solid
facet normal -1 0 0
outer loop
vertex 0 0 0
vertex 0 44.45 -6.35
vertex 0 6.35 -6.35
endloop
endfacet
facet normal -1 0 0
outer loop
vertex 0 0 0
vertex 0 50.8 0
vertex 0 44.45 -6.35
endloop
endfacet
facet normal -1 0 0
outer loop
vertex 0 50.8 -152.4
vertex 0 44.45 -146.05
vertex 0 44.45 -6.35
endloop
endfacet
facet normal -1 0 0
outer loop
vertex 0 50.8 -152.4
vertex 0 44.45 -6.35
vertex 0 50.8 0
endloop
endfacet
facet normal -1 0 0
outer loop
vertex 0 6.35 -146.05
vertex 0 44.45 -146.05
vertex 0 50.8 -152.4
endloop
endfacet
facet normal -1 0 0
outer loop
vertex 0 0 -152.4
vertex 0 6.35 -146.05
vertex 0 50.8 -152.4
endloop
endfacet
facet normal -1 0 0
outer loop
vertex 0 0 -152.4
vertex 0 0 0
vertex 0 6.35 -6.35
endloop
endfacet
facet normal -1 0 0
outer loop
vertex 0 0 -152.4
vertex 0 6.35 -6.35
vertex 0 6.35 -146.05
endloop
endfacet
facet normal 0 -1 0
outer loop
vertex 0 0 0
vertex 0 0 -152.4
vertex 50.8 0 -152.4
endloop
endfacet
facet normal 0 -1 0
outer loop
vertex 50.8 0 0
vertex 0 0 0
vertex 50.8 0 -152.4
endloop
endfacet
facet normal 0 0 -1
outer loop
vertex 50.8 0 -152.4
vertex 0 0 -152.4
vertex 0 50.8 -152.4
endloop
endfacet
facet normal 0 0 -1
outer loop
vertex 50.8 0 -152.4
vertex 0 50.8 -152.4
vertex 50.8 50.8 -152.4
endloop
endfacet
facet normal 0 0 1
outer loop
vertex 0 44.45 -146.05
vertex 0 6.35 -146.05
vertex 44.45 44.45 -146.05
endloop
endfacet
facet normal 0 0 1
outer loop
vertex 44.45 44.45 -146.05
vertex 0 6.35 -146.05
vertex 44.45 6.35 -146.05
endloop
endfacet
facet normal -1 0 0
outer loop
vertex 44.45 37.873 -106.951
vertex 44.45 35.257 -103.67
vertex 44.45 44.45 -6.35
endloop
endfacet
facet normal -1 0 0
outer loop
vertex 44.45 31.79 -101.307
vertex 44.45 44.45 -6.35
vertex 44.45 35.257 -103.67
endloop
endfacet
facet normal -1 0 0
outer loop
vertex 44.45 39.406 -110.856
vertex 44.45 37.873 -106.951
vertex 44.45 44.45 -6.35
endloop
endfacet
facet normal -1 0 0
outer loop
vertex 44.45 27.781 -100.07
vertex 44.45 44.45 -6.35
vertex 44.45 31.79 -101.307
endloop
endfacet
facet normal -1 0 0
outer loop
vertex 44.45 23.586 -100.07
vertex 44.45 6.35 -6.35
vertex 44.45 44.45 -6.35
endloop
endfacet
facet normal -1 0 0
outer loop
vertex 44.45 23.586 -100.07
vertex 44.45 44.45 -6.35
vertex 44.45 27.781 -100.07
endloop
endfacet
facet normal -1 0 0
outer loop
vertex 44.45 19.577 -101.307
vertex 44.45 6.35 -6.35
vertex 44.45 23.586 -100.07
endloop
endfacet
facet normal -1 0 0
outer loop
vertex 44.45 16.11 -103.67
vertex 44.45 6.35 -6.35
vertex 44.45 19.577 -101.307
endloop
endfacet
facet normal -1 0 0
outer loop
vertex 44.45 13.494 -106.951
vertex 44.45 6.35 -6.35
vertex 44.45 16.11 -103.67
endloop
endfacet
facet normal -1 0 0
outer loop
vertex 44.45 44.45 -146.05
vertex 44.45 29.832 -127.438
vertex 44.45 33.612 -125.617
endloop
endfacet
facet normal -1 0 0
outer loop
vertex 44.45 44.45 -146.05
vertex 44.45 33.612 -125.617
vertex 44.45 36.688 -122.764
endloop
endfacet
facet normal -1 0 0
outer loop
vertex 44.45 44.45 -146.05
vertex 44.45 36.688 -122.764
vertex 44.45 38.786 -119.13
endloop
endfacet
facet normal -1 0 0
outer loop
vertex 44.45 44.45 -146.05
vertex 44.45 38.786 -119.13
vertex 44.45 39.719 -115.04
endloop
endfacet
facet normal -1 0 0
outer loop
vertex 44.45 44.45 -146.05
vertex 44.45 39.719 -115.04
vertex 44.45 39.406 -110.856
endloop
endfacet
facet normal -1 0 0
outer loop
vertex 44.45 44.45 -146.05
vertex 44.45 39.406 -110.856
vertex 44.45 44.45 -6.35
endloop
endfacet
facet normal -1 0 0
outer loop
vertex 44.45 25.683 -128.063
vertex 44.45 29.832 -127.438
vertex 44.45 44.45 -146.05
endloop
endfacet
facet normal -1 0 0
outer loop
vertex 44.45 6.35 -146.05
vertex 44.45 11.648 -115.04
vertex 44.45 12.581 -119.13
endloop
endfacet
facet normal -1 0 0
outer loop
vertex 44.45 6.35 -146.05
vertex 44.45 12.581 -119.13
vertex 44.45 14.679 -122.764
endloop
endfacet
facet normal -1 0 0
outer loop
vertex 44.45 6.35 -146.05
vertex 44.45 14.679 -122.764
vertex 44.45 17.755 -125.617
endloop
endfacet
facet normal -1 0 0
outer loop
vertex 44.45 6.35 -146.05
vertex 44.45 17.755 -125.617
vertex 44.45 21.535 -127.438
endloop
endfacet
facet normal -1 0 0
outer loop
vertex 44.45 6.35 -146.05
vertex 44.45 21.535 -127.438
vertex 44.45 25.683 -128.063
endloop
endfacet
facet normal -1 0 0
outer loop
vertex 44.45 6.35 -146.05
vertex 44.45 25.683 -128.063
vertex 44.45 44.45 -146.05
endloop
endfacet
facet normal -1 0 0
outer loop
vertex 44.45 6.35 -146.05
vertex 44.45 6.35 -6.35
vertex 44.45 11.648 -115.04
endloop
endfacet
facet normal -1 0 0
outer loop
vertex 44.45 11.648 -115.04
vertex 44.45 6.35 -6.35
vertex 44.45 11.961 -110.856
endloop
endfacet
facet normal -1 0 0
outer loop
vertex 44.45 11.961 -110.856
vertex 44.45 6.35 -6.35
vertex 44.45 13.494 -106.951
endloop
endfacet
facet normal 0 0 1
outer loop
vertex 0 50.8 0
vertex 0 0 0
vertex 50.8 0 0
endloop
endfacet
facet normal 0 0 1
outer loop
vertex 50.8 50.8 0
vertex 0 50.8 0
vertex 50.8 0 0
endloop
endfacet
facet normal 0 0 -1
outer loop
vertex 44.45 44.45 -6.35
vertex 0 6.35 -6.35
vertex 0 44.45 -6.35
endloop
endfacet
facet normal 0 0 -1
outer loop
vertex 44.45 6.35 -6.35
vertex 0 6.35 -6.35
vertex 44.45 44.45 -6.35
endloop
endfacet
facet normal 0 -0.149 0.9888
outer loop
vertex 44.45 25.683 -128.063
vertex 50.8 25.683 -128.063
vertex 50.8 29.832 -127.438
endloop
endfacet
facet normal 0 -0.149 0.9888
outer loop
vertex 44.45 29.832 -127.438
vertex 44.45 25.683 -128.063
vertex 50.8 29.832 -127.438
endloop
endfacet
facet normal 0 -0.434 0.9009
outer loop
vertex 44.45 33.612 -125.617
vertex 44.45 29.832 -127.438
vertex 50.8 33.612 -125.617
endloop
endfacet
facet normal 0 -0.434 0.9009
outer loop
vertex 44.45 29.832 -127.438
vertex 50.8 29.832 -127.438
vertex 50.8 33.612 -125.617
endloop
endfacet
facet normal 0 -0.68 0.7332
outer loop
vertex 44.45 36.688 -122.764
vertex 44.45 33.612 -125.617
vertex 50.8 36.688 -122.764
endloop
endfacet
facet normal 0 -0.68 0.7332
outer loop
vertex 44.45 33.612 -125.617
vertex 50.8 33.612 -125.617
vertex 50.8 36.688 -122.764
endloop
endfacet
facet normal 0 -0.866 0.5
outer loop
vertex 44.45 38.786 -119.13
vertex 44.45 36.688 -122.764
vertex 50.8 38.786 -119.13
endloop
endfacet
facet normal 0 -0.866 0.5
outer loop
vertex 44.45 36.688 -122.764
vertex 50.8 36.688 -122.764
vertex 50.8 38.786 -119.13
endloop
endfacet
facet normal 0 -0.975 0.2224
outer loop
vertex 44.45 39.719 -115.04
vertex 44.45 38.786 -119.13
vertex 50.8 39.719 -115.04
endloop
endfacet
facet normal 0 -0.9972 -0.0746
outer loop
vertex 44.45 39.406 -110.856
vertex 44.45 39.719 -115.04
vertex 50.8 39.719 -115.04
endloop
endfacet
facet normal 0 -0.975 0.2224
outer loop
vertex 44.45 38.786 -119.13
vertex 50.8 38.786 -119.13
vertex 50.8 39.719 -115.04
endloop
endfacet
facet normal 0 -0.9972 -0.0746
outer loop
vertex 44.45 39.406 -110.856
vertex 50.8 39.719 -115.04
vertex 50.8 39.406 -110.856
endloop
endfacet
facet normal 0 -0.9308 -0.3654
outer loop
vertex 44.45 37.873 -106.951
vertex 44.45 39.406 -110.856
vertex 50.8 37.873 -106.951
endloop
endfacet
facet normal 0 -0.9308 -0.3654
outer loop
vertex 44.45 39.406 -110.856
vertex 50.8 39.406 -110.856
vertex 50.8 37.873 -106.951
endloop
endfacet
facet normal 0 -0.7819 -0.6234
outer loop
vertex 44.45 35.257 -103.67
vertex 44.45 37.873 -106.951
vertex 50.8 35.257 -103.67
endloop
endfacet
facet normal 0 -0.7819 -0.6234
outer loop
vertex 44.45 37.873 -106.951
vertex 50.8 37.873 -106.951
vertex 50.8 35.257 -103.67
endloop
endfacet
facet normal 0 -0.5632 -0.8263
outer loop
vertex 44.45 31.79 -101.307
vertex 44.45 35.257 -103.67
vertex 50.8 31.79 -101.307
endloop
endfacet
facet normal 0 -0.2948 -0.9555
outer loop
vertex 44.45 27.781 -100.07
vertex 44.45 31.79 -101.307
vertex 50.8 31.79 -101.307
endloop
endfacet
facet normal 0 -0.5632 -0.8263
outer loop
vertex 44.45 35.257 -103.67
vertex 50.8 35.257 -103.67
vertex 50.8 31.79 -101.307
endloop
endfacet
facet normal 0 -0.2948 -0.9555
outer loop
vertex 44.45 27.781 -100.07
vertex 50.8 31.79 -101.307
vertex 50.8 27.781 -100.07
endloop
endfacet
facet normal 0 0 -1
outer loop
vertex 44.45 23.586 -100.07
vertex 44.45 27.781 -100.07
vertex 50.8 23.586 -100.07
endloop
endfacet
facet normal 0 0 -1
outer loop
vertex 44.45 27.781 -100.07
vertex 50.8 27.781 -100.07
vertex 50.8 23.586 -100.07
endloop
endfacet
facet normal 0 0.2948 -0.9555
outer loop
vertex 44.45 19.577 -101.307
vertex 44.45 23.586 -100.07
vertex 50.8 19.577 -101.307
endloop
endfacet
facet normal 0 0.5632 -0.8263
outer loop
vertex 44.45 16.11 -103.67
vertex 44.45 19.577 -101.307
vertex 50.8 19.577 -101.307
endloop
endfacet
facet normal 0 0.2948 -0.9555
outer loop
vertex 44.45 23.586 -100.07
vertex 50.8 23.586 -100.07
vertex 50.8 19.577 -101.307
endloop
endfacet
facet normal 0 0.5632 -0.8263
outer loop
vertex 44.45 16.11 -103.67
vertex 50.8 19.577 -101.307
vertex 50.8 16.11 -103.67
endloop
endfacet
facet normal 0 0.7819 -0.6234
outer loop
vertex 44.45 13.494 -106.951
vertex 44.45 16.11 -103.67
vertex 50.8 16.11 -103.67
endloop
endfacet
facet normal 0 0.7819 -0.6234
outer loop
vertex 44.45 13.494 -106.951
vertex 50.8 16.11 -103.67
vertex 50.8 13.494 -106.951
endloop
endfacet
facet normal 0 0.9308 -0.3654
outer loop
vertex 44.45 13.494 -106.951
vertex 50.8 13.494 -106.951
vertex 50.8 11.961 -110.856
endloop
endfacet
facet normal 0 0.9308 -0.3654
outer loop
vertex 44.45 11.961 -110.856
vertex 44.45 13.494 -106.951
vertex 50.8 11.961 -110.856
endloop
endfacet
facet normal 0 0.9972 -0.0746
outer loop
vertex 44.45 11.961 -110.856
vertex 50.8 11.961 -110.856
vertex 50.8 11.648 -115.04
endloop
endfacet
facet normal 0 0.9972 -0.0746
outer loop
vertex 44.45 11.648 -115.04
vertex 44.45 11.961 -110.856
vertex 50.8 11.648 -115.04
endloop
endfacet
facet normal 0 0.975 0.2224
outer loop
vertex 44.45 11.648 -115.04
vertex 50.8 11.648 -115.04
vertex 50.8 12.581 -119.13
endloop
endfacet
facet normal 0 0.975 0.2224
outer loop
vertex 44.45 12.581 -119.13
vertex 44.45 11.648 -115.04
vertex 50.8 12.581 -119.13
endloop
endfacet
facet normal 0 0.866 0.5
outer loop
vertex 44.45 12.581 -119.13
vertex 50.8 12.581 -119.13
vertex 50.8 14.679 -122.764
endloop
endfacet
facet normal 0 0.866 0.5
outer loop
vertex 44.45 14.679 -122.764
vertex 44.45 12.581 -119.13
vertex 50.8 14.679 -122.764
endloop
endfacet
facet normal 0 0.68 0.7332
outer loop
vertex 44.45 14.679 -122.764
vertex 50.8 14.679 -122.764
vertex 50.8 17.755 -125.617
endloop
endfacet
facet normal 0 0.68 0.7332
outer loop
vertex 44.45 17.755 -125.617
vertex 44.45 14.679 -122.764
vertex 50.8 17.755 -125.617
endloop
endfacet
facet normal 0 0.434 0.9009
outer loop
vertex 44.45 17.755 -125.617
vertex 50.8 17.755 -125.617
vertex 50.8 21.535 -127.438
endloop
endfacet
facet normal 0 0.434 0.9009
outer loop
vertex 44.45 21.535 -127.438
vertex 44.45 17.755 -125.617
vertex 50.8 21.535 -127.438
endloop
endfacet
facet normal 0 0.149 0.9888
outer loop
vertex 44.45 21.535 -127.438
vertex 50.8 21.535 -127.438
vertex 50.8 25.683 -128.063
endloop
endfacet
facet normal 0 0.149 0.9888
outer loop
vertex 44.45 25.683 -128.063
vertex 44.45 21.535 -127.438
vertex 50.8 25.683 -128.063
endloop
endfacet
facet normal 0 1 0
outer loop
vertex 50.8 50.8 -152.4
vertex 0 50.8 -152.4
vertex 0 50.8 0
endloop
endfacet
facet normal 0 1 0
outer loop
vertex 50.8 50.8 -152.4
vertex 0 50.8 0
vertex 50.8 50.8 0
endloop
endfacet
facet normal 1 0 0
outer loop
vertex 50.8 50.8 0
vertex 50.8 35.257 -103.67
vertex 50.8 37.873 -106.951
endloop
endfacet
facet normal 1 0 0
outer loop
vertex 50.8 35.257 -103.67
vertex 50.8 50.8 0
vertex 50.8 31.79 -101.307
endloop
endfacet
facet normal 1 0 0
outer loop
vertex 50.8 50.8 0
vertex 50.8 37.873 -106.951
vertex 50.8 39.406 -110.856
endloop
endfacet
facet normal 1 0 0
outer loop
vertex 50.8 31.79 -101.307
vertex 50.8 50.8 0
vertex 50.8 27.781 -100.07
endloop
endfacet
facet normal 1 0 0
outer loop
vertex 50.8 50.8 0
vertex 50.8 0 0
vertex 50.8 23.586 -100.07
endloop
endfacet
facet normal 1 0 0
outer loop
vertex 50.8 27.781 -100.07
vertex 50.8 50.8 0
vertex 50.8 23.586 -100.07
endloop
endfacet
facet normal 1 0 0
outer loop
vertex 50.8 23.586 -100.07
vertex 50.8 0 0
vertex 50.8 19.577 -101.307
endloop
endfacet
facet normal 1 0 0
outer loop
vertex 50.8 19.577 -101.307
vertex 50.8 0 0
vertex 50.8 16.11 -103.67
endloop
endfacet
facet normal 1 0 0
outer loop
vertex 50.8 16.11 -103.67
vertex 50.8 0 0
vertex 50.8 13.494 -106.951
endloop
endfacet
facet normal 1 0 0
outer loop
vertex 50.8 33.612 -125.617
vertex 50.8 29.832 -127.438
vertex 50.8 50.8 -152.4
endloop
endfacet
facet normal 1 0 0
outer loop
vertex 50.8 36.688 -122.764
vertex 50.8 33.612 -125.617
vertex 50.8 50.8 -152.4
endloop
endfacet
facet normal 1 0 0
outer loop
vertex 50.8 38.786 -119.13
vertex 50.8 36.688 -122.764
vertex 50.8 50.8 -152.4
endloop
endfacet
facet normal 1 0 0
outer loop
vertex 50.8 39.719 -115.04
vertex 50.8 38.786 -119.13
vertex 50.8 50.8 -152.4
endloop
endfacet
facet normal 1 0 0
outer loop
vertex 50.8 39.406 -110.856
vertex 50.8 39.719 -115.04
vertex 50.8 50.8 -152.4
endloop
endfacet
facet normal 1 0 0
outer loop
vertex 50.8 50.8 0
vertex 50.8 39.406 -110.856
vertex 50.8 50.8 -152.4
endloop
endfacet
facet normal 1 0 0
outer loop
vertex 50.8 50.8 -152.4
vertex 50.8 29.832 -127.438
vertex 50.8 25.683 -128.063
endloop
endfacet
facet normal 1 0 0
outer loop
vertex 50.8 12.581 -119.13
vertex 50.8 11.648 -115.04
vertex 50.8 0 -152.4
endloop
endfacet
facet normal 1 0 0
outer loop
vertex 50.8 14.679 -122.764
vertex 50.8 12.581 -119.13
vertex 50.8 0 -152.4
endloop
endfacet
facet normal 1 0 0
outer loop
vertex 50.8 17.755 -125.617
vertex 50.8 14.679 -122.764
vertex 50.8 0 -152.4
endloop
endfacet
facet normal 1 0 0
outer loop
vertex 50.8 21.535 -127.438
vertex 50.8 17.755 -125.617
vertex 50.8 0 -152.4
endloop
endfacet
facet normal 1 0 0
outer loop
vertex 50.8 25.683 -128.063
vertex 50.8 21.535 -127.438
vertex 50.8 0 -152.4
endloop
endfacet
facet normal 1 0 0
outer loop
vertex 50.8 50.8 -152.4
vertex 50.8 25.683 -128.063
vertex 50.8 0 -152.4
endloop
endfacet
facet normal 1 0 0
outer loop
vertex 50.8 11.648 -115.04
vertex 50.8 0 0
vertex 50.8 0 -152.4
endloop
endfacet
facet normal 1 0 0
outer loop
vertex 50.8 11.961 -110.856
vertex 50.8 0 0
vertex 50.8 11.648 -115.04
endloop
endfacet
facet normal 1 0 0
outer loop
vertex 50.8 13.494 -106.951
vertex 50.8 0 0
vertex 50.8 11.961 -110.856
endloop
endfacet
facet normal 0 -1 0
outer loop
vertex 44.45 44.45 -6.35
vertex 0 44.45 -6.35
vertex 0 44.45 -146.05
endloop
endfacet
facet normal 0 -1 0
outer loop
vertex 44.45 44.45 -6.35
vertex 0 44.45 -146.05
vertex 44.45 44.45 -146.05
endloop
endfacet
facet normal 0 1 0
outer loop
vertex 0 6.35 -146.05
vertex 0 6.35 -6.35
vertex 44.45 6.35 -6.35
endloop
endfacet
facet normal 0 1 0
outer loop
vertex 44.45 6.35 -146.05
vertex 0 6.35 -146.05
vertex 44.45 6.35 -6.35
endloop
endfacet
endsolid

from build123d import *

# Parameters (mm, degrees)
SKETCH1_W           = 50.8
SKETCH1_H           = 152.4
BOSS_EXTRUDE1_DEPTH = 50.8
SHELL1_T            = -6.35
SKETCH4_R           = 14.075
CUT_EXTRUDE1_DEPTH  = 25


with BuildPart() as part:
    # Sketch1 → Boss-Extrude1 (new body)
    with BuildSketch(Plane(origin=(0, 0, 0), x_dir=(1, 0, 0), z_dir=(0, 1, 0))):
        with Locations((25.4, 76.2)):
            Rectangle(SKETCH1_W, SKETCH1_H)
    extrude(amount=BOSS_EXTRUDE1_DEPTH)

    # Shell1
    shell1_openings = [part.faces().sort_by_distance(p)[0] for p in [
        (0, 25.4, -76.2),
    ]]
    offset(amount=SHELL1_T, openings=shell1_openings, kind=Kind.INTERSECTION)

    # Sketch4 → Cut-Extrude1 (cut)
    with BuildSketch(Plane(origin=(50.8, 0, 0), x_dir=(0, 0, -1), z_dir=(1, 0, 0))):
        with Locations((113.988045791, 25.683455189)):
            Circle(SKETCH4_R)
    extrude(amount=-CUT_EXTRUDE1_DEPTH, mode=Mode.SUBTRACT)


solid = part.part
